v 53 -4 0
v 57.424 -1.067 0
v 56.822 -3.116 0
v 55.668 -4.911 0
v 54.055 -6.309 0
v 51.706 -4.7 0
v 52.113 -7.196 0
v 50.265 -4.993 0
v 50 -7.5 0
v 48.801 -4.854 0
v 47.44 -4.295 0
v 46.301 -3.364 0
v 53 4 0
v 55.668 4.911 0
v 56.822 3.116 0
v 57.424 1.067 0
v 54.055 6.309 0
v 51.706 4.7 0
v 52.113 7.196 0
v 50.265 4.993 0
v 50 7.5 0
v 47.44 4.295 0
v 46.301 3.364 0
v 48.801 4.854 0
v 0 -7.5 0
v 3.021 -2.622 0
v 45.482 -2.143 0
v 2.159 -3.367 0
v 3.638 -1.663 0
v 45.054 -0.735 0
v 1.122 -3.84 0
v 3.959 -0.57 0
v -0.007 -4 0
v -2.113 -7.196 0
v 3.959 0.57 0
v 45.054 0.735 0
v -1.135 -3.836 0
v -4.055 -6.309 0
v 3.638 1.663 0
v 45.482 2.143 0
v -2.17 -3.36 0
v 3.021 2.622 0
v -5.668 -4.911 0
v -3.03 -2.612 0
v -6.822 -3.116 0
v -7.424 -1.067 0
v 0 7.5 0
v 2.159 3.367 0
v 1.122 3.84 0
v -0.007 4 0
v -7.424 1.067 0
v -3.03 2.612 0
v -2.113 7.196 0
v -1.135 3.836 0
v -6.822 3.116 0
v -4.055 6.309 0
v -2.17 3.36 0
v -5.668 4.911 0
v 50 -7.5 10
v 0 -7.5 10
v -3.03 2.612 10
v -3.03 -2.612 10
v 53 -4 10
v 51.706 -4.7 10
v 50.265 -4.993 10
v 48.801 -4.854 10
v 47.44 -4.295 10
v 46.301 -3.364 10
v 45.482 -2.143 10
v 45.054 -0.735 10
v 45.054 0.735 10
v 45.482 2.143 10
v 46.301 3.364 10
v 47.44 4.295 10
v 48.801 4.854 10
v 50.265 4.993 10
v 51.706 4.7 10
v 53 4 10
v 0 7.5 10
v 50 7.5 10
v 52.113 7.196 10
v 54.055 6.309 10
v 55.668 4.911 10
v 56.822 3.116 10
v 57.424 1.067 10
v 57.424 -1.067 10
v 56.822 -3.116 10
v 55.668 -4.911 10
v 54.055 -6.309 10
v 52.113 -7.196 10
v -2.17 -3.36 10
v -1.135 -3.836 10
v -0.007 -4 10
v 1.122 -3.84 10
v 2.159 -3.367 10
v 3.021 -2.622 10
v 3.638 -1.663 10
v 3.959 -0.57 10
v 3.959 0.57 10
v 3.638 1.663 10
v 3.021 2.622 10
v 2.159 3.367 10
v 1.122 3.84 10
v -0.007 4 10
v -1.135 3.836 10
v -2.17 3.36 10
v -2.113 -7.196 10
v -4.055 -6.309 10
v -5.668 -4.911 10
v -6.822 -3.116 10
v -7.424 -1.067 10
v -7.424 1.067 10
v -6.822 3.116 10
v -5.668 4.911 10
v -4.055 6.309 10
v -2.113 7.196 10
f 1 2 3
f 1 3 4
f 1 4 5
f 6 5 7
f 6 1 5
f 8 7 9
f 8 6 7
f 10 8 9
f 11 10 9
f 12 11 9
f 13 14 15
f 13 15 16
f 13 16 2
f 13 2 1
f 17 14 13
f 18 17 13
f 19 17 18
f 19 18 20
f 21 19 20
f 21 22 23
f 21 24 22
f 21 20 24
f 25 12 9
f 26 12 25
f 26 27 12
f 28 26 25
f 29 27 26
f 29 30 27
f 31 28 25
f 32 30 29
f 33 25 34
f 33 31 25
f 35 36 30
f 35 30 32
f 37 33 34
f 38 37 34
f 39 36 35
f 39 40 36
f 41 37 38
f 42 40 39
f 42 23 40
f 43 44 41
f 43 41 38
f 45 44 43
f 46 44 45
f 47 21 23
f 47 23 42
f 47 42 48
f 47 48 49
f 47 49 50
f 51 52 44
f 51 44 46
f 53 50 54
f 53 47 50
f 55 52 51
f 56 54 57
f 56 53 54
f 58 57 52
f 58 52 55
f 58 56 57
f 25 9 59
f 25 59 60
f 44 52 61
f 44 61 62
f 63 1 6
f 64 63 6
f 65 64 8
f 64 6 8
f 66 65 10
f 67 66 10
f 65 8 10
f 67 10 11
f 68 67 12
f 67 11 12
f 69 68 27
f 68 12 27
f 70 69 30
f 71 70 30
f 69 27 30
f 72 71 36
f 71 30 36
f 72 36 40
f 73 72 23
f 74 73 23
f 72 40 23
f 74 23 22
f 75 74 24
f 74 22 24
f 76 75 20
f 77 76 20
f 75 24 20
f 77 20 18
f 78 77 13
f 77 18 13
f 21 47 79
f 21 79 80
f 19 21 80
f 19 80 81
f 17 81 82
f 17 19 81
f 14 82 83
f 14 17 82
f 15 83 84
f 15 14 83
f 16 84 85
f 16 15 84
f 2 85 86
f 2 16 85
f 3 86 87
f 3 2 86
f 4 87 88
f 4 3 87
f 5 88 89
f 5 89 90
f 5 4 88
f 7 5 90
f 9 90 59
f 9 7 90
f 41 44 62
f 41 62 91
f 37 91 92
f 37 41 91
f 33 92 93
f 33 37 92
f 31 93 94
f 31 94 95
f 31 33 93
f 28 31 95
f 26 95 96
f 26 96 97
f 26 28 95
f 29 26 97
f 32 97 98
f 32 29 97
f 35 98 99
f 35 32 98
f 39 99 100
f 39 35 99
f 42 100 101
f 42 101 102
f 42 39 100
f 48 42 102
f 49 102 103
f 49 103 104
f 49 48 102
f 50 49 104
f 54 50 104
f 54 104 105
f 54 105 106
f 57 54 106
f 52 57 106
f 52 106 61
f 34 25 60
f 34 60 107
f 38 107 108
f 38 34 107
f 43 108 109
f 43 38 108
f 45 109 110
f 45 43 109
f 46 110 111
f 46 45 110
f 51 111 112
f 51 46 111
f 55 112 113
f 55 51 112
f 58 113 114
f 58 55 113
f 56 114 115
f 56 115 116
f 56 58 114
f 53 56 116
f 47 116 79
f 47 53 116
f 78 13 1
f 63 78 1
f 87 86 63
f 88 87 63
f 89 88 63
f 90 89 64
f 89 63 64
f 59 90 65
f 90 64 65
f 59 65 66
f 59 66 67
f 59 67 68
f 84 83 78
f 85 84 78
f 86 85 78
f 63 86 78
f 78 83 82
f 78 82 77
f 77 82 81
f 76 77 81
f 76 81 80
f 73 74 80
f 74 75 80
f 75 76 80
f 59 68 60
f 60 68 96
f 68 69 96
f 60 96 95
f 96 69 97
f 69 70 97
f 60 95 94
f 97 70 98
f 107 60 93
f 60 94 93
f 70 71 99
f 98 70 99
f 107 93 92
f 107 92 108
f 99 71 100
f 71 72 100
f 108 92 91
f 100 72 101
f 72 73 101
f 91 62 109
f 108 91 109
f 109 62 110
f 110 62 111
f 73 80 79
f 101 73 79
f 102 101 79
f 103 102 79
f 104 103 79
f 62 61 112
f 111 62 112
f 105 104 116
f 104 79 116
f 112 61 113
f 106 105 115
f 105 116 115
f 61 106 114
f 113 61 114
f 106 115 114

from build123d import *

# Parameters (mm, degrees)
Y_KSEKLIK_EKSTR_ZYON1_DEPTH = 10


with BuildPart() as part:
    # Çizim1 → Yükseklik-Ekstrüzyon1 (new body)
    with BuildSketch(Plane.XY):
        with BuildLine():
            Line((0, 7.5), (50, 7.5))
            ThreePointArc((50, 7.5), (57.5, 0), (50, -7.5))
            Line((50, -7.5), (0, -7.5))
            ThreePointArc((0, -7.5), (-7.5, 0), (0, 7.5))
        make_face()
        with BuildLine():
            Line((53, 4), (53, -4))
            ThreePointArc((53, -4), (45, 0), (53, 4))
        make_face(mode=Mode.SUBTRACT)
        with BuildLine():
            Line((-3.029770917, 2.611606439), (-3.029770917, -2.611606439))
            ThreePointArc((-3.029770917, -2.611606439), (4, 0), (-3.029770917, 2.611606439))
        make_face(mode=Mode.SUBTRACT)
    extrude(amount=Y_KSEKLIK_EKSTR_ZYON1_DEPTH)


solid = part.part
